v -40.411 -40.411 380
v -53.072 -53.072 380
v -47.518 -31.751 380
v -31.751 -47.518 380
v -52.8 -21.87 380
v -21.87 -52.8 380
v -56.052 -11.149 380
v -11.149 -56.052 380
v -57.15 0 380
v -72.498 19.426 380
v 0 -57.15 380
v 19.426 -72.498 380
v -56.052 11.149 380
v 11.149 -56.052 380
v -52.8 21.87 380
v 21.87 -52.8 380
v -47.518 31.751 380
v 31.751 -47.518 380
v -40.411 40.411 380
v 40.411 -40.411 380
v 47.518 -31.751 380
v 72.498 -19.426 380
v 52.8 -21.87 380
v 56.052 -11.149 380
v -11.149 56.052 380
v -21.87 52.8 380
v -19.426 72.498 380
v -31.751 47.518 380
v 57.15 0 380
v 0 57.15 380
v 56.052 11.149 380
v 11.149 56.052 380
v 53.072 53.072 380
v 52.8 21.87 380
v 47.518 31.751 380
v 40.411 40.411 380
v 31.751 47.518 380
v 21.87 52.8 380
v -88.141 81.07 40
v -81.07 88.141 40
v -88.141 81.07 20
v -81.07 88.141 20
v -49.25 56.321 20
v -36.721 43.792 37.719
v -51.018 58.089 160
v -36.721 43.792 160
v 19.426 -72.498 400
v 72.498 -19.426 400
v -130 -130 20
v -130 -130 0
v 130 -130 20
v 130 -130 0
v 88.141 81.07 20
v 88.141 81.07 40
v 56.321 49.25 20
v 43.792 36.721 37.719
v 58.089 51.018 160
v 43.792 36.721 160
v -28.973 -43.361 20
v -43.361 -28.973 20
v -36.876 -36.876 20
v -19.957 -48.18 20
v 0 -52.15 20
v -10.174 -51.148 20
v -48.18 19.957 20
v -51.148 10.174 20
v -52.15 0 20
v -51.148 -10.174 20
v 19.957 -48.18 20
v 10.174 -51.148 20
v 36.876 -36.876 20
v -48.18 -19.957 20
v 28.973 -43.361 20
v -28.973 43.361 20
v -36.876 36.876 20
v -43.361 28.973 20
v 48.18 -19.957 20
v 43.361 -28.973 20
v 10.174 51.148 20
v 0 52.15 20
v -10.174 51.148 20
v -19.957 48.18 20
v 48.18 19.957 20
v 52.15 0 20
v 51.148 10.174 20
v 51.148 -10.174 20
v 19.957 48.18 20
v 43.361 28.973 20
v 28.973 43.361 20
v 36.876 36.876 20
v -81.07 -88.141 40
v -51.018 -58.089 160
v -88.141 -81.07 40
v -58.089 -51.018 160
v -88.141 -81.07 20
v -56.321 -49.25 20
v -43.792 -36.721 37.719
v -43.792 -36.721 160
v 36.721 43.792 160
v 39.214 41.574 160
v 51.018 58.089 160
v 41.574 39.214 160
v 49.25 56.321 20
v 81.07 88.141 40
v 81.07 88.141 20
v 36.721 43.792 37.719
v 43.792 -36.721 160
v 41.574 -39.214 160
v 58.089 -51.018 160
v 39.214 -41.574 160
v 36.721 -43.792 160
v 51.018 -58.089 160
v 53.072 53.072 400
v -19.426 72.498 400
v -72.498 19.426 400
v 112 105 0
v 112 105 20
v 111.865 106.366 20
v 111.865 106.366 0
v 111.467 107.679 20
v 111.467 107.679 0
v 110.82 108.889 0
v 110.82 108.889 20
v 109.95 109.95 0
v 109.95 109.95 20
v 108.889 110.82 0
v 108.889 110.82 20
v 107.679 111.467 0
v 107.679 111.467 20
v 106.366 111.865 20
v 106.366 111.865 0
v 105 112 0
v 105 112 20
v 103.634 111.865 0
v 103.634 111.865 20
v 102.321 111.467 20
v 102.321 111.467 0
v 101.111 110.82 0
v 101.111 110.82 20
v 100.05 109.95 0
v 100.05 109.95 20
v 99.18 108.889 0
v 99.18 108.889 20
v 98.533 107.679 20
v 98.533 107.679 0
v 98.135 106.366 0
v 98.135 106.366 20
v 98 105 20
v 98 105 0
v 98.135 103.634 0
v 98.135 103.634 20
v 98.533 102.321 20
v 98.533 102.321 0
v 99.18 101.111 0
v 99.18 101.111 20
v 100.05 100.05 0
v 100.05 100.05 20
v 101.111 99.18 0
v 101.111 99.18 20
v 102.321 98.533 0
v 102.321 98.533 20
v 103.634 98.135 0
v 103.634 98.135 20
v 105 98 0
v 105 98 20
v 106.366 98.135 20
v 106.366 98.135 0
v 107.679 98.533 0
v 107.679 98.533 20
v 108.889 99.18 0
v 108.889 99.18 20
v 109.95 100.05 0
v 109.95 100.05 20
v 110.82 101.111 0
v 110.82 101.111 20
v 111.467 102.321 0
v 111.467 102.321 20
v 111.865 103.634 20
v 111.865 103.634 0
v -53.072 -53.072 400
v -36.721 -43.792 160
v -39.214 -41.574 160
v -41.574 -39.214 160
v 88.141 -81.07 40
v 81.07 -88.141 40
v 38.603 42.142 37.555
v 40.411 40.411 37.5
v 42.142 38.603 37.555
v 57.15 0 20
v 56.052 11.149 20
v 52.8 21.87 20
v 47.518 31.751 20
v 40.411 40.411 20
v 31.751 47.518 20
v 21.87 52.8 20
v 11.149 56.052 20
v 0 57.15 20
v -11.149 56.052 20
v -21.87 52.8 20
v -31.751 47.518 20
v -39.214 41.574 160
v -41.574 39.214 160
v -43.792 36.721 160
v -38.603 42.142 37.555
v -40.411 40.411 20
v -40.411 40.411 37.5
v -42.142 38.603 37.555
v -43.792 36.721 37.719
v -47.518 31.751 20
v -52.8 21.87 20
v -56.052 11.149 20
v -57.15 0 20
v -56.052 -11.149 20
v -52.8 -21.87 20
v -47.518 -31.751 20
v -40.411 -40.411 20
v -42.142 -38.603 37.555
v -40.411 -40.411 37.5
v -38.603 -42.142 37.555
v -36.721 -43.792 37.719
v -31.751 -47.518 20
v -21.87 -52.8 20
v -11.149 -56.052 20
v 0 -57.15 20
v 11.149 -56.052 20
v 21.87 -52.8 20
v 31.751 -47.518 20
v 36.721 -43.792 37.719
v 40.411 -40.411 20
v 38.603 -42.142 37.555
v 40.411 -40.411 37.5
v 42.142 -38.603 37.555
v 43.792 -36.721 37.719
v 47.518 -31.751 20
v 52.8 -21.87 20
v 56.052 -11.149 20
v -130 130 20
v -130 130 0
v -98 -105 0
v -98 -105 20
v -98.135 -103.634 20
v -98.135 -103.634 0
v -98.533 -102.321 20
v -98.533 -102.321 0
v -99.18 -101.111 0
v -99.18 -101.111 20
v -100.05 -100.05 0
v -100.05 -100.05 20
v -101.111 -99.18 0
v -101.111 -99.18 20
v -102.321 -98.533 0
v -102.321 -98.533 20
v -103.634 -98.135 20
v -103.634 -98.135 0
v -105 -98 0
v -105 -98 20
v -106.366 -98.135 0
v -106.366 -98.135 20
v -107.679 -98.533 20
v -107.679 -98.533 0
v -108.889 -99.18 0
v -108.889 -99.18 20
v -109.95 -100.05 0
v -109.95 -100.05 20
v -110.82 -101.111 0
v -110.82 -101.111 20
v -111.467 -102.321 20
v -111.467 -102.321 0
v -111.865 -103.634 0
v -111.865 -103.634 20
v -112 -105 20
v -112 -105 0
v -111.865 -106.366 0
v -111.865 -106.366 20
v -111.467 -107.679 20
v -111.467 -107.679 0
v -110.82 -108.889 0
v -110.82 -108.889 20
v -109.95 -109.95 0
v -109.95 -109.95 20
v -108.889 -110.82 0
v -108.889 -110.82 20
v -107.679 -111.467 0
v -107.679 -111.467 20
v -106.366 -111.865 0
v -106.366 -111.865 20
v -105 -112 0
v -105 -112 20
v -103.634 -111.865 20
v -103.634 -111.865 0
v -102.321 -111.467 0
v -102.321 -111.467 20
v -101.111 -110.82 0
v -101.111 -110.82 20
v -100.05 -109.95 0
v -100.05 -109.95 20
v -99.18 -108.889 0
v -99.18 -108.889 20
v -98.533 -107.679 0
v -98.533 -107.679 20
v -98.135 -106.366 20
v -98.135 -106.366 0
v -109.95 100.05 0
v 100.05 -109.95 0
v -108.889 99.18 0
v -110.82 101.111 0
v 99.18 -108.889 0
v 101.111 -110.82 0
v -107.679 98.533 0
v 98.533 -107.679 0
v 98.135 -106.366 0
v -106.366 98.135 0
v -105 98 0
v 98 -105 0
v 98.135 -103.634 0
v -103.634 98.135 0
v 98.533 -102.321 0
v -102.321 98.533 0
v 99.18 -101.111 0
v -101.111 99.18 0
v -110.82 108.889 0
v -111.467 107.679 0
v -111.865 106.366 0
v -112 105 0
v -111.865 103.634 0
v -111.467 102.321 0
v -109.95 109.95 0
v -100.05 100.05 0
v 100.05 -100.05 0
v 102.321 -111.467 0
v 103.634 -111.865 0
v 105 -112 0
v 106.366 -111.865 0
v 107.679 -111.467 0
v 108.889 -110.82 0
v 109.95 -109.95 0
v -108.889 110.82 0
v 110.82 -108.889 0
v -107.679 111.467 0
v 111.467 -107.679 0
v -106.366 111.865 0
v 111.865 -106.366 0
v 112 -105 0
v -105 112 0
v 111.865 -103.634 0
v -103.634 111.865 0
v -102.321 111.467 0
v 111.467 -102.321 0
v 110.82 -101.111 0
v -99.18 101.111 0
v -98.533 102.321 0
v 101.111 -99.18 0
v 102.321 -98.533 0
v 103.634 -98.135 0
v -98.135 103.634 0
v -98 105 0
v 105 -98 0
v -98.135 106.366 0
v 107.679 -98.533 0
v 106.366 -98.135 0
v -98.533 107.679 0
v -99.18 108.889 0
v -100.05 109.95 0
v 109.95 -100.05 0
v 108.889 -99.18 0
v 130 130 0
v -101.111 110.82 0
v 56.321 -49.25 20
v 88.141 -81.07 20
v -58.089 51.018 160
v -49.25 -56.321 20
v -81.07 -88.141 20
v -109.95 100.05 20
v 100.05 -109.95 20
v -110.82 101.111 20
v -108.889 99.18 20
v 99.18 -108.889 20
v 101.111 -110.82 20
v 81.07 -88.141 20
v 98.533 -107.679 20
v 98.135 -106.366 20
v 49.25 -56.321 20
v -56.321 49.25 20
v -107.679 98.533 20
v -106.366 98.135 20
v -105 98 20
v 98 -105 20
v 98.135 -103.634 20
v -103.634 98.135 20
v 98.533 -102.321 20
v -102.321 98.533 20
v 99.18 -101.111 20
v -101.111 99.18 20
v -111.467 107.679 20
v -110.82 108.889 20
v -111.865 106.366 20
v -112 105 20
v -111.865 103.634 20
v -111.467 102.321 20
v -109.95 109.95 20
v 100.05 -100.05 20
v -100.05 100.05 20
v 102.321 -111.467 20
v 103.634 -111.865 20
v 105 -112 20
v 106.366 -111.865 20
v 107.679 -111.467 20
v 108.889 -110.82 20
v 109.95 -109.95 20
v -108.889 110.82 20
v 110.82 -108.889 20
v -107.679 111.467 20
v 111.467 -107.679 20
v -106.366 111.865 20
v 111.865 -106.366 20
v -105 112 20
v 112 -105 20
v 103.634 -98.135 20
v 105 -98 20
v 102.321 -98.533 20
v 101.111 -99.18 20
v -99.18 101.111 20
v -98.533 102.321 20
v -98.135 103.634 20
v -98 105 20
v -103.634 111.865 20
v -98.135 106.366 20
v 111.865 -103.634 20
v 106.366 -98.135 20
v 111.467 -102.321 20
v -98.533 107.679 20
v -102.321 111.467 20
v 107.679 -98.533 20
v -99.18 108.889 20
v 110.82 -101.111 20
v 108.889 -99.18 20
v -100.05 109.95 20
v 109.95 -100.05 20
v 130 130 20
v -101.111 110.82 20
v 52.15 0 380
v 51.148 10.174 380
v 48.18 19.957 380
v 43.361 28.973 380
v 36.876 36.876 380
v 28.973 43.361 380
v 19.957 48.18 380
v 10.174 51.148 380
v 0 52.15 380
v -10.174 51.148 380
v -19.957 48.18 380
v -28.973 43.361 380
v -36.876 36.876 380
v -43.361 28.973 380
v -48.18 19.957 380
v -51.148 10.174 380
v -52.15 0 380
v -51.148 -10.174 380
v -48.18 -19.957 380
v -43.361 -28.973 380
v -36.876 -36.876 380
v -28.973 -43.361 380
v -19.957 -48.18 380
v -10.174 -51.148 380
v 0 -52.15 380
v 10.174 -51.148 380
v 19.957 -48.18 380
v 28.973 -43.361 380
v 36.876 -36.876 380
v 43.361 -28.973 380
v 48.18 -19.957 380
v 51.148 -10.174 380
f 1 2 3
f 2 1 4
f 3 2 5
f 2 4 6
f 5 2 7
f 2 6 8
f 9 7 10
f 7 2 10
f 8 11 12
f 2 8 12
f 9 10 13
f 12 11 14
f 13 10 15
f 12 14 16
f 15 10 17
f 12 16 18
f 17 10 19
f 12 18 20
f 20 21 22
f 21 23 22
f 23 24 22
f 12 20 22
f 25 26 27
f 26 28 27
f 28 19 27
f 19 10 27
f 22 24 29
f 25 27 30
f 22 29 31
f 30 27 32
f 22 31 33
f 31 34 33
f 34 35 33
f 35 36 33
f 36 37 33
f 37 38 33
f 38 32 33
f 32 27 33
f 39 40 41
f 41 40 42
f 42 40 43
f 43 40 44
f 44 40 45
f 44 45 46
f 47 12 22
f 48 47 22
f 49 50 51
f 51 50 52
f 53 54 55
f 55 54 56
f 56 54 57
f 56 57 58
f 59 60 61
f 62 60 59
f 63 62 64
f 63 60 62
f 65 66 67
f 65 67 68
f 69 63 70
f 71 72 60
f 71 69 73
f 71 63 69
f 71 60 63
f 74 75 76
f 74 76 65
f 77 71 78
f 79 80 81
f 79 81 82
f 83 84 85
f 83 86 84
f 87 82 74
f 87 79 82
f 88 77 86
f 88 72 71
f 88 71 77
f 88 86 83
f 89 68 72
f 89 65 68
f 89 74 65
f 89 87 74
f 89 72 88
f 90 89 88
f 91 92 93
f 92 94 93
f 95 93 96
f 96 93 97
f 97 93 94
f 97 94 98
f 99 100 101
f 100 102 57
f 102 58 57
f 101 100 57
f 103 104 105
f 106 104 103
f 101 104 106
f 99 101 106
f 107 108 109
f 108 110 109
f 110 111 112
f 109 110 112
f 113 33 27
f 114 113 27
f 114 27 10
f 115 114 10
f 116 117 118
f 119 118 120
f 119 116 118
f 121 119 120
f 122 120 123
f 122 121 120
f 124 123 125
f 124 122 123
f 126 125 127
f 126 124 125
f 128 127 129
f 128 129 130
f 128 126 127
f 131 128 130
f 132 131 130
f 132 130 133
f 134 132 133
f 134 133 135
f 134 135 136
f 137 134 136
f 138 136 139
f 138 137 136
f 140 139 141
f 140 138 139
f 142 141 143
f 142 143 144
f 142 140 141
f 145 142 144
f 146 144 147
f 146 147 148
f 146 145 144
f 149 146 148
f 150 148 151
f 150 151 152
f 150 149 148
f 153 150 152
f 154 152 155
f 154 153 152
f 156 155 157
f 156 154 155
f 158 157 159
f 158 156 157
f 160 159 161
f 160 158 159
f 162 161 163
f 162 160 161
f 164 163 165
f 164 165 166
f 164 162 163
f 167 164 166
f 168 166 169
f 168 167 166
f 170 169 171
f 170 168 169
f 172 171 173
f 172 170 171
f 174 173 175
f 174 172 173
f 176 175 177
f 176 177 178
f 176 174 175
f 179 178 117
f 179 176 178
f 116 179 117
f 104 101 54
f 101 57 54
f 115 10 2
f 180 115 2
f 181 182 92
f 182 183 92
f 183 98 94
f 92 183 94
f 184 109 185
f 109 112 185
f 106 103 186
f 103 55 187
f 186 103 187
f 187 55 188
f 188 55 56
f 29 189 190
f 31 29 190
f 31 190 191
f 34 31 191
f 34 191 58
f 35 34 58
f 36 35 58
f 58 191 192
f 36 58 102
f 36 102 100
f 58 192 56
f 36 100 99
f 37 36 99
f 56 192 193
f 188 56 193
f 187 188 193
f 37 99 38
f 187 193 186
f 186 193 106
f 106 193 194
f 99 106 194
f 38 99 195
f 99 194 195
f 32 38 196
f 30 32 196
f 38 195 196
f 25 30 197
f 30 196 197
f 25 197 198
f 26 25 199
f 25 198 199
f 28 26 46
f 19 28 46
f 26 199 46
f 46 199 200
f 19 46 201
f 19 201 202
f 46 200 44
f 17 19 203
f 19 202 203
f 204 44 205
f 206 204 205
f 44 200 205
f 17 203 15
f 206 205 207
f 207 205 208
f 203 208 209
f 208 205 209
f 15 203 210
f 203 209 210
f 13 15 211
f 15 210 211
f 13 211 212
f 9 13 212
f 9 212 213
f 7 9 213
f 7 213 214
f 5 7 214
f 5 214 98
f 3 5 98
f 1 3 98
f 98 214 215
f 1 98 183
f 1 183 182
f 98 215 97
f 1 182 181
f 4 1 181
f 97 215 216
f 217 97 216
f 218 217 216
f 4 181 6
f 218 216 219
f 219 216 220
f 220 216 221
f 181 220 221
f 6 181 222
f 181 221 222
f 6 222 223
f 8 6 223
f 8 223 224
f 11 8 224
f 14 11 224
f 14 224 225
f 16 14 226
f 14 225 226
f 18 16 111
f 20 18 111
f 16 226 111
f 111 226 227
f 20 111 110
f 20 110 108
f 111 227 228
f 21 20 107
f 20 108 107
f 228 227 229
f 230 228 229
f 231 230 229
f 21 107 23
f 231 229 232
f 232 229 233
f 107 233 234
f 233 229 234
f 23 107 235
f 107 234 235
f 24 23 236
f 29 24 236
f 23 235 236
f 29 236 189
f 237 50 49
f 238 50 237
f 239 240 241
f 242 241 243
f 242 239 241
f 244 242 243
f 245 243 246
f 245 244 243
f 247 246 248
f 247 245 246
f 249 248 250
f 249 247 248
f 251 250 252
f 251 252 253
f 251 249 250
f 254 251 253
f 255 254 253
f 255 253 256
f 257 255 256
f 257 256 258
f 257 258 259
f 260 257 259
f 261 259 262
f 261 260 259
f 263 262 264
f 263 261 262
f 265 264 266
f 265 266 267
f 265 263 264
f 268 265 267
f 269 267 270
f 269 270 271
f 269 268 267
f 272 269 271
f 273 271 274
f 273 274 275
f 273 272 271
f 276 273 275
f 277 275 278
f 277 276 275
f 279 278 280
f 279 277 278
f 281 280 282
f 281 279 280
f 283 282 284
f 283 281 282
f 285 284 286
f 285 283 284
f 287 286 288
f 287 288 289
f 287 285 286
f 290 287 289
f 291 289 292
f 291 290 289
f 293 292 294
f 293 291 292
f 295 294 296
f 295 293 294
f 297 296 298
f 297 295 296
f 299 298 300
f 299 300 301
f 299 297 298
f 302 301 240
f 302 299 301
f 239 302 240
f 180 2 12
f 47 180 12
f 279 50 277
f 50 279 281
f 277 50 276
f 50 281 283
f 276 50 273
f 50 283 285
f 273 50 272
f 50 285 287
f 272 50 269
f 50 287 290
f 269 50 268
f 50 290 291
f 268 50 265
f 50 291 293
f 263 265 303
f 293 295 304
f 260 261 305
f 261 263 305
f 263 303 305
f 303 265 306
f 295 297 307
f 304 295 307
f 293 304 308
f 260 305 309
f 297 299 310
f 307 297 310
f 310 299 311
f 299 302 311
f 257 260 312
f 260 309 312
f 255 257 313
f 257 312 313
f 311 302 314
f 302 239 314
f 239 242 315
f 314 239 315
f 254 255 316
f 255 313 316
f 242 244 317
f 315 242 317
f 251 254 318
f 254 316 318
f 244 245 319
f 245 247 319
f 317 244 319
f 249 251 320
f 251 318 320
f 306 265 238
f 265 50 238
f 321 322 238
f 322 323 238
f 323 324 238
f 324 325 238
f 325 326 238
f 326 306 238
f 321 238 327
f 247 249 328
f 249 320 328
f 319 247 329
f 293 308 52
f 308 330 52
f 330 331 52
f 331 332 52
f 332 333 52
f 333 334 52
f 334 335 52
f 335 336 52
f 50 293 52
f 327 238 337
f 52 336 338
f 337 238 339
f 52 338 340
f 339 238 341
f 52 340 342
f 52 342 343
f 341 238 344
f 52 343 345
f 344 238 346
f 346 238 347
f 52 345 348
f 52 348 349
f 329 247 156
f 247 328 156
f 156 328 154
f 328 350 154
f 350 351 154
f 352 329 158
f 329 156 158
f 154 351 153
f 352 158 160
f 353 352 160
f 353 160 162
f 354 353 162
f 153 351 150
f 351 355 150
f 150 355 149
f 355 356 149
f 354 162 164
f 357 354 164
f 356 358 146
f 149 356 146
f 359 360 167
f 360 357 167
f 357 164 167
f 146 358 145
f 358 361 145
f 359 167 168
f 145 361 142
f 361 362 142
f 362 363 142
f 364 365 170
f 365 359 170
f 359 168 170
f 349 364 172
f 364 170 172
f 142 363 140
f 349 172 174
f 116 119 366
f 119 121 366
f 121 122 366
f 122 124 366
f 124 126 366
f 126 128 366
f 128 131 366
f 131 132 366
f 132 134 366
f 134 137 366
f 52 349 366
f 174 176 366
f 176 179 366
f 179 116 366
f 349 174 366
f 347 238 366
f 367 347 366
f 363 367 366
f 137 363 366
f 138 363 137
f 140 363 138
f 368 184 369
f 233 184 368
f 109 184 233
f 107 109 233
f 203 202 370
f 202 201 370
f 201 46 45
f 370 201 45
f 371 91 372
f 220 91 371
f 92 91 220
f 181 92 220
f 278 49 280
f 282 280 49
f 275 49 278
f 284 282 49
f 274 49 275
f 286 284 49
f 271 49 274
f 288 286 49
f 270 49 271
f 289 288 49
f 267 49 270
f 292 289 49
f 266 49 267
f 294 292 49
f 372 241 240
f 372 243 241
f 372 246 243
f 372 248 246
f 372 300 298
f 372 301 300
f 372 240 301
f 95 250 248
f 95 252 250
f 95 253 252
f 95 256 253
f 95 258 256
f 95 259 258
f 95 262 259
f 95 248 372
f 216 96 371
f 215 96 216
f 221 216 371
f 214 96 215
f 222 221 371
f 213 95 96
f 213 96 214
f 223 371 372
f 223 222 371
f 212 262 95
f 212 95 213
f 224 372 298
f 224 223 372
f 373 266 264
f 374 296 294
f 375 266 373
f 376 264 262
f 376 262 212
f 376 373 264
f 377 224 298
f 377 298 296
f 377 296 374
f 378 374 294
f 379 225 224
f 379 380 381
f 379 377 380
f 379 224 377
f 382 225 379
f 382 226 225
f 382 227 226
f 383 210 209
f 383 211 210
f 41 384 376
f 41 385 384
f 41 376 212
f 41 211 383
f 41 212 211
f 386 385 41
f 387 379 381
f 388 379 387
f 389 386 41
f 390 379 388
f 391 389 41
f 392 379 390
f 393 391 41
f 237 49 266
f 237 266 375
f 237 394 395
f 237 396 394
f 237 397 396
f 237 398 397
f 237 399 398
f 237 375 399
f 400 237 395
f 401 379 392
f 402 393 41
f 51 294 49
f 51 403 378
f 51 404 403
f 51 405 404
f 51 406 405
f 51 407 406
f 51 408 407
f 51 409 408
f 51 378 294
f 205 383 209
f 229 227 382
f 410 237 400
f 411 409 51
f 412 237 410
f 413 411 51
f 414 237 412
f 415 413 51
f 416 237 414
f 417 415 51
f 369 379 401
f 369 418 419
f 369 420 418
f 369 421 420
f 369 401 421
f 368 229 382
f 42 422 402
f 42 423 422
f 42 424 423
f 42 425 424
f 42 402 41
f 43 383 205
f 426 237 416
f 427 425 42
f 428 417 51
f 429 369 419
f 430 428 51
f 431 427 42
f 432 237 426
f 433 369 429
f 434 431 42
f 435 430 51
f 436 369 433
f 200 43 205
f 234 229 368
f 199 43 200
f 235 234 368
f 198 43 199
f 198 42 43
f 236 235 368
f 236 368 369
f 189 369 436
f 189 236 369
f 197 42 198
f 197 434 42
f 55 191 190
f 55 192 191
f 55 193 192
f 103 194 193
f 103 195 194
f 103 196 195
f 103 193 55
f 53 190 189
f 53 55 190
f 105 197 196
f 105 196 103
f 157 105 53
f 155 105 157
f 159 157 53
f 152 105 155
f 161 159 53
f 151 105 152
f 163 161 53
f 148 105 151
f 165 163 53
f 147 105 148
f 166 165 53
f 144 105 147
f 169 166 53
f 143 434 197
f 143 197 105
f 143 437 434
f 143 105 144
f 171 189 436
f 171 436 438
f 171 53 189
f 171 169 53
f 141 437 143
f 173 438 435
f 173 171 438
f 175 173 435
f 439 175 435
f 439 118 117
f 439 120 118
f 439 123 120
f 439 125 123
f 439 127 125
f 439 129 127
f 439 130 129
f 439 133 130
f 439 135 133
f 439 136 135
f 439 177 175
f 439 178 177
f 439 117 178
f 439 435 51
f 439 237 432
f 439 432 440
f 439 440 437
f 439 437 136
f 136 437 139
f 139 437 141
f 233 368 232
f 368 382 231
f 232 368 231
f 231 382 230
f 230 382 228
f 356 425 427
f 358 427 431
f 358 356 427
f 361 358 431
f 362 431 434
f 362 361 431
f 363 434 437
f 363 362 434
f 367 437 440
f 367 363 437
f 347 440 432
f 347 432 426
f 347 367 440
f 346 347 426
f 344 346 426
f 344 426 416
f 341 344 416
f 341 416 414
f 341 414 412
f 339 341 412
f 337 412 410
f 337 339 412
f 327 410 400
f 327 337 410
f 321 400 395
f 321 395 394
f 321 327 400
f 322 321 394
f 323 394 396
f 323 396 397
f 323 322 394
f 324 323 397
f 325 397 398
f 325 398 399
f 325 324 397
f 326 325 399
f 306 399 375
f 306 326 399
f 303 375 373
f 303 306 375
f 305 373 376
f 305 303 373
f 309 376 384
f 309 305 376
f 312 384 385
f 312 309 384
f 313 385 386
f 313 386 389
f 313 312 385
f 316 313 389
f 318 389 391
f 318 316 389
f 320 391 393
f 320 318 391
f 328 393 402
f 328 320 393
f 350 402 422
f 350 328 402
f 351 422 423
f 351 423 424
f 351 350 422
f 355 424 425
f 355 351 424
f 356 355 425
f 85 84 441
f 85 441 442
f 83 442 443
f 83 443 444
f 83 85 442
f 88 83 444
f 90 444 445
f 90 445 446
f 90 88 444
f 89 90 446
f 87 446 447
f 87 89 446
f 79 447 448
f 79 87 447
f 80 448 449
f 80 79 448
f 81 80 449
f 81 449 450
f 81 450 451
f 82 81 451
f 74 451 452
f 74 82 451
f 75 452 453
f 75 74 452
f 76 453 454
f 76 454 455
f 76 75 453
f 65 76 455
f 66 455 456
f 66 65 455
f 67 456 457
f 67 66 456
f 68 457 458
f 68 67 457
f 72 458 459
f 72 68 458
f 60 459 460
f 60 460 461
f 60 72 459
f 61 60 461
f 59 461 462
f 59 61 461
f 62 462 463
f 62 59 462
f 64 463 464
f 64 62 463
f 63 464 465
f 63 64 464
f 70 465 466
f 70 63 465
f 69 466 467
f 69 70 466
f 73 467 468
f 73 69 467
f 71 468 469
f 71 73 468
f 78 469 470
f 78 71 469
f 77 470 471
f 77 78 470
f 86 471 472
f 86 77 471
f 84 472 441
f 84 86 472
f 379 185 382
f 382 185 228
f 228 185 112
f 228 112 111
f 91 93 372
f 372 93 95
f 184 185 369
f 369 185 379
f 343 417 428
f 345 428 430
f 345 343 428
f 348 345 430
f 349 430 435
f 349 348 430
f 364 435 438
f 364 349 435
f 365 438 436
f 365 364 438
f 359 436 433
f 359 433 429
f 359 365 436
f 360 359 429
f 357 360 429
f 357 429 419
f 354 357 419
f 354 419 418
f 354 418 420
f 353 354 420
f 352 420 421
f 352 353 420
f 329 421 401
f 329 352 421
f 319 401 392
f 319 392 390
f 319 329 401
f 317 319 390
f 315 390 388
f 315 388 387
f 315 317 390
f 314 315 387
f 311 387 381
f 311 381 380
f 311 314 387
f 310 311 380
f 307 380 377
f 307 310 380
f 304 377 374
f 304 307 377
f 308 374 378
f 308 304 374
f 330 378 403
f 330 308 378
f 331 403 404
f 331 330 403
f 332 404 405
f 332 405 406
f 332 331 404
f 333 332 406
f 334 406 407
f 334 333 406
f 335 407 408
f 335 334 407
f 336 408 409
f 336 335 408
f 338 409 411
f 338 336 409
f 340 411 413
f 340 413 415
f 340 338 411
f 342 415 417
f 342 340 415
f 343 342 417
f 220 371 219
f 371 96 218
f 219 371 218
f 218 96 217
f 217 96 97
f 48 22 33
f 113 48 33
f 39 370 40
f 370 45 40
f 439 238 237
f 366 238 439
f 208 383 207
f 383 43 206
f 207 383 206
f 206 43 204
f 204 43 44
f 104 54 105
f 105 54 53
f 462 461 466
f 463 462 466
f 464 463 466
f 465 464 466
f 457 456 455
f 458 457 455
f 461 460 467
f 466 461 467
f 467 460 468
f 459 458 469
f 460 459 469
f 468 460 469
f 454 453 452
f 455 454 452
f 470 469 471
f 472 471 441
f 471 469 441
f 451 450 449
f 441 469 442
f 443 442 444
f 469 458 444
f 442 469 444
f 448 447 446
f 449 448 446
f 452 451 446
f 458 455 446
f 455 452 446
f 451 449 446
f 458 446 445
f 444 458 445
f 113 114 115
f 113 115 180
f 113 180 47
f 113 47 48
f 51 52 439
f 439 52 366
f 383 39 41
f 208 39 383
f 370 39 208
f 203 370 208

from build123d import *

# Parameters (mm, degrees)
SKETCH001_R           = 57.15
SKETCH001_R_2         = 52.15
EXTRUDE001_DEPTH      = 360
EXTRUDE002_DEPTH      = 5
ARRAY_COUNT           = 4
ARRAY_PLACEMENT_ANGLE = 45
EXTRUDE003_DEPTH      = 20
SKETCH_W              = 260
SKETCH_H              = 260
SKETCH_R              = 7
EXTRUDE_DEPTH         = 20


with BuildPart() as r114x5:
    # Sketch001 (on Face10 of Extrude) → Extrude001 (new body)
    with BuildSketch(Plane.XY.offset(20)):
        Circle(SKETCH001_R)
        Circle(SKETCH001_R_2, mode=Mode.SUBTRACT)
    extrude(amount=EXTRUDE001_DEPTH)


with BuildPart() as steifen:
    # Sketch002 → Extrude002 (new body, symmetric)
    with BuildSketch(Plane.XZ):
        Polygon((54.65, 160), (77.15, 160), (119.65, 40), (119.65, 20), (74.65, 20), (54.65, 40), align=None)
    extrude(amount=EXTRUDE002_DEPTH, both=True)

    # Array: steifen ×4 about axis
    array_axis = Axis((0, 0, 0), (0, 0, 1))


with BuildPart() as steifen_1:
    add(steifen.part)
    for i in range(1, ARRAY_COUNT):
        add(steifen.part.rotate(array_axis, i * 360 / ARRAY_COUNT))


with BuildPart() as steifen_2:
    # Array placement: moved
    add(steifen_1.part.rotate(Axis((0, 0, 0), (0, 0, 1)), ARRAY_PLACEMENT_ANGLE))


with BuildPart() as lastplatte:
    # Sketch003 (on Face4 of Extrude001) → Extrude003 (new body)
    with BuildSketch(Plane.XY.offset(380)):
        Polygon((72.49808, -19.425802), (53.072278, 53.072278), (-19.425802, 72.49808), (-72.49808, 19.425802), (-53.072278, -53.072278), (19.425802, -72.49808), align=None)
    extrude(amount=EXTRUDE003_DEPTH)


with BuildPart() as fusion:
    # Sketch → Extrude (new body)
    with BuildSketch(Plane.XY):
        Rectangle(SKETCH_W, SKETCH_H)
        with Locations((-105, 105)):
            Circle(SKETCH_R, mode=Mode.SUBTRACT)
        with Locations((105, 105)):
            Circle(SKETCH_R, mode=Mode.SUBTRACT)
        with Locations((-105, -105)):
            Circle(SKETCH_R, mode=Mode.SUBTRACT)
        with Locations((105, -105)):
            Circle(SKETCH_R, mode=Mode.SUBTRACT)
    extrude(amount=EXTRUDE_DEPTH)

    # Fusion: union R114x5, steifen, lastplatte
    add(r114x5.part)
    add(steifen_2.part)
    add(lastplatte.part)


solid = fusion.part
